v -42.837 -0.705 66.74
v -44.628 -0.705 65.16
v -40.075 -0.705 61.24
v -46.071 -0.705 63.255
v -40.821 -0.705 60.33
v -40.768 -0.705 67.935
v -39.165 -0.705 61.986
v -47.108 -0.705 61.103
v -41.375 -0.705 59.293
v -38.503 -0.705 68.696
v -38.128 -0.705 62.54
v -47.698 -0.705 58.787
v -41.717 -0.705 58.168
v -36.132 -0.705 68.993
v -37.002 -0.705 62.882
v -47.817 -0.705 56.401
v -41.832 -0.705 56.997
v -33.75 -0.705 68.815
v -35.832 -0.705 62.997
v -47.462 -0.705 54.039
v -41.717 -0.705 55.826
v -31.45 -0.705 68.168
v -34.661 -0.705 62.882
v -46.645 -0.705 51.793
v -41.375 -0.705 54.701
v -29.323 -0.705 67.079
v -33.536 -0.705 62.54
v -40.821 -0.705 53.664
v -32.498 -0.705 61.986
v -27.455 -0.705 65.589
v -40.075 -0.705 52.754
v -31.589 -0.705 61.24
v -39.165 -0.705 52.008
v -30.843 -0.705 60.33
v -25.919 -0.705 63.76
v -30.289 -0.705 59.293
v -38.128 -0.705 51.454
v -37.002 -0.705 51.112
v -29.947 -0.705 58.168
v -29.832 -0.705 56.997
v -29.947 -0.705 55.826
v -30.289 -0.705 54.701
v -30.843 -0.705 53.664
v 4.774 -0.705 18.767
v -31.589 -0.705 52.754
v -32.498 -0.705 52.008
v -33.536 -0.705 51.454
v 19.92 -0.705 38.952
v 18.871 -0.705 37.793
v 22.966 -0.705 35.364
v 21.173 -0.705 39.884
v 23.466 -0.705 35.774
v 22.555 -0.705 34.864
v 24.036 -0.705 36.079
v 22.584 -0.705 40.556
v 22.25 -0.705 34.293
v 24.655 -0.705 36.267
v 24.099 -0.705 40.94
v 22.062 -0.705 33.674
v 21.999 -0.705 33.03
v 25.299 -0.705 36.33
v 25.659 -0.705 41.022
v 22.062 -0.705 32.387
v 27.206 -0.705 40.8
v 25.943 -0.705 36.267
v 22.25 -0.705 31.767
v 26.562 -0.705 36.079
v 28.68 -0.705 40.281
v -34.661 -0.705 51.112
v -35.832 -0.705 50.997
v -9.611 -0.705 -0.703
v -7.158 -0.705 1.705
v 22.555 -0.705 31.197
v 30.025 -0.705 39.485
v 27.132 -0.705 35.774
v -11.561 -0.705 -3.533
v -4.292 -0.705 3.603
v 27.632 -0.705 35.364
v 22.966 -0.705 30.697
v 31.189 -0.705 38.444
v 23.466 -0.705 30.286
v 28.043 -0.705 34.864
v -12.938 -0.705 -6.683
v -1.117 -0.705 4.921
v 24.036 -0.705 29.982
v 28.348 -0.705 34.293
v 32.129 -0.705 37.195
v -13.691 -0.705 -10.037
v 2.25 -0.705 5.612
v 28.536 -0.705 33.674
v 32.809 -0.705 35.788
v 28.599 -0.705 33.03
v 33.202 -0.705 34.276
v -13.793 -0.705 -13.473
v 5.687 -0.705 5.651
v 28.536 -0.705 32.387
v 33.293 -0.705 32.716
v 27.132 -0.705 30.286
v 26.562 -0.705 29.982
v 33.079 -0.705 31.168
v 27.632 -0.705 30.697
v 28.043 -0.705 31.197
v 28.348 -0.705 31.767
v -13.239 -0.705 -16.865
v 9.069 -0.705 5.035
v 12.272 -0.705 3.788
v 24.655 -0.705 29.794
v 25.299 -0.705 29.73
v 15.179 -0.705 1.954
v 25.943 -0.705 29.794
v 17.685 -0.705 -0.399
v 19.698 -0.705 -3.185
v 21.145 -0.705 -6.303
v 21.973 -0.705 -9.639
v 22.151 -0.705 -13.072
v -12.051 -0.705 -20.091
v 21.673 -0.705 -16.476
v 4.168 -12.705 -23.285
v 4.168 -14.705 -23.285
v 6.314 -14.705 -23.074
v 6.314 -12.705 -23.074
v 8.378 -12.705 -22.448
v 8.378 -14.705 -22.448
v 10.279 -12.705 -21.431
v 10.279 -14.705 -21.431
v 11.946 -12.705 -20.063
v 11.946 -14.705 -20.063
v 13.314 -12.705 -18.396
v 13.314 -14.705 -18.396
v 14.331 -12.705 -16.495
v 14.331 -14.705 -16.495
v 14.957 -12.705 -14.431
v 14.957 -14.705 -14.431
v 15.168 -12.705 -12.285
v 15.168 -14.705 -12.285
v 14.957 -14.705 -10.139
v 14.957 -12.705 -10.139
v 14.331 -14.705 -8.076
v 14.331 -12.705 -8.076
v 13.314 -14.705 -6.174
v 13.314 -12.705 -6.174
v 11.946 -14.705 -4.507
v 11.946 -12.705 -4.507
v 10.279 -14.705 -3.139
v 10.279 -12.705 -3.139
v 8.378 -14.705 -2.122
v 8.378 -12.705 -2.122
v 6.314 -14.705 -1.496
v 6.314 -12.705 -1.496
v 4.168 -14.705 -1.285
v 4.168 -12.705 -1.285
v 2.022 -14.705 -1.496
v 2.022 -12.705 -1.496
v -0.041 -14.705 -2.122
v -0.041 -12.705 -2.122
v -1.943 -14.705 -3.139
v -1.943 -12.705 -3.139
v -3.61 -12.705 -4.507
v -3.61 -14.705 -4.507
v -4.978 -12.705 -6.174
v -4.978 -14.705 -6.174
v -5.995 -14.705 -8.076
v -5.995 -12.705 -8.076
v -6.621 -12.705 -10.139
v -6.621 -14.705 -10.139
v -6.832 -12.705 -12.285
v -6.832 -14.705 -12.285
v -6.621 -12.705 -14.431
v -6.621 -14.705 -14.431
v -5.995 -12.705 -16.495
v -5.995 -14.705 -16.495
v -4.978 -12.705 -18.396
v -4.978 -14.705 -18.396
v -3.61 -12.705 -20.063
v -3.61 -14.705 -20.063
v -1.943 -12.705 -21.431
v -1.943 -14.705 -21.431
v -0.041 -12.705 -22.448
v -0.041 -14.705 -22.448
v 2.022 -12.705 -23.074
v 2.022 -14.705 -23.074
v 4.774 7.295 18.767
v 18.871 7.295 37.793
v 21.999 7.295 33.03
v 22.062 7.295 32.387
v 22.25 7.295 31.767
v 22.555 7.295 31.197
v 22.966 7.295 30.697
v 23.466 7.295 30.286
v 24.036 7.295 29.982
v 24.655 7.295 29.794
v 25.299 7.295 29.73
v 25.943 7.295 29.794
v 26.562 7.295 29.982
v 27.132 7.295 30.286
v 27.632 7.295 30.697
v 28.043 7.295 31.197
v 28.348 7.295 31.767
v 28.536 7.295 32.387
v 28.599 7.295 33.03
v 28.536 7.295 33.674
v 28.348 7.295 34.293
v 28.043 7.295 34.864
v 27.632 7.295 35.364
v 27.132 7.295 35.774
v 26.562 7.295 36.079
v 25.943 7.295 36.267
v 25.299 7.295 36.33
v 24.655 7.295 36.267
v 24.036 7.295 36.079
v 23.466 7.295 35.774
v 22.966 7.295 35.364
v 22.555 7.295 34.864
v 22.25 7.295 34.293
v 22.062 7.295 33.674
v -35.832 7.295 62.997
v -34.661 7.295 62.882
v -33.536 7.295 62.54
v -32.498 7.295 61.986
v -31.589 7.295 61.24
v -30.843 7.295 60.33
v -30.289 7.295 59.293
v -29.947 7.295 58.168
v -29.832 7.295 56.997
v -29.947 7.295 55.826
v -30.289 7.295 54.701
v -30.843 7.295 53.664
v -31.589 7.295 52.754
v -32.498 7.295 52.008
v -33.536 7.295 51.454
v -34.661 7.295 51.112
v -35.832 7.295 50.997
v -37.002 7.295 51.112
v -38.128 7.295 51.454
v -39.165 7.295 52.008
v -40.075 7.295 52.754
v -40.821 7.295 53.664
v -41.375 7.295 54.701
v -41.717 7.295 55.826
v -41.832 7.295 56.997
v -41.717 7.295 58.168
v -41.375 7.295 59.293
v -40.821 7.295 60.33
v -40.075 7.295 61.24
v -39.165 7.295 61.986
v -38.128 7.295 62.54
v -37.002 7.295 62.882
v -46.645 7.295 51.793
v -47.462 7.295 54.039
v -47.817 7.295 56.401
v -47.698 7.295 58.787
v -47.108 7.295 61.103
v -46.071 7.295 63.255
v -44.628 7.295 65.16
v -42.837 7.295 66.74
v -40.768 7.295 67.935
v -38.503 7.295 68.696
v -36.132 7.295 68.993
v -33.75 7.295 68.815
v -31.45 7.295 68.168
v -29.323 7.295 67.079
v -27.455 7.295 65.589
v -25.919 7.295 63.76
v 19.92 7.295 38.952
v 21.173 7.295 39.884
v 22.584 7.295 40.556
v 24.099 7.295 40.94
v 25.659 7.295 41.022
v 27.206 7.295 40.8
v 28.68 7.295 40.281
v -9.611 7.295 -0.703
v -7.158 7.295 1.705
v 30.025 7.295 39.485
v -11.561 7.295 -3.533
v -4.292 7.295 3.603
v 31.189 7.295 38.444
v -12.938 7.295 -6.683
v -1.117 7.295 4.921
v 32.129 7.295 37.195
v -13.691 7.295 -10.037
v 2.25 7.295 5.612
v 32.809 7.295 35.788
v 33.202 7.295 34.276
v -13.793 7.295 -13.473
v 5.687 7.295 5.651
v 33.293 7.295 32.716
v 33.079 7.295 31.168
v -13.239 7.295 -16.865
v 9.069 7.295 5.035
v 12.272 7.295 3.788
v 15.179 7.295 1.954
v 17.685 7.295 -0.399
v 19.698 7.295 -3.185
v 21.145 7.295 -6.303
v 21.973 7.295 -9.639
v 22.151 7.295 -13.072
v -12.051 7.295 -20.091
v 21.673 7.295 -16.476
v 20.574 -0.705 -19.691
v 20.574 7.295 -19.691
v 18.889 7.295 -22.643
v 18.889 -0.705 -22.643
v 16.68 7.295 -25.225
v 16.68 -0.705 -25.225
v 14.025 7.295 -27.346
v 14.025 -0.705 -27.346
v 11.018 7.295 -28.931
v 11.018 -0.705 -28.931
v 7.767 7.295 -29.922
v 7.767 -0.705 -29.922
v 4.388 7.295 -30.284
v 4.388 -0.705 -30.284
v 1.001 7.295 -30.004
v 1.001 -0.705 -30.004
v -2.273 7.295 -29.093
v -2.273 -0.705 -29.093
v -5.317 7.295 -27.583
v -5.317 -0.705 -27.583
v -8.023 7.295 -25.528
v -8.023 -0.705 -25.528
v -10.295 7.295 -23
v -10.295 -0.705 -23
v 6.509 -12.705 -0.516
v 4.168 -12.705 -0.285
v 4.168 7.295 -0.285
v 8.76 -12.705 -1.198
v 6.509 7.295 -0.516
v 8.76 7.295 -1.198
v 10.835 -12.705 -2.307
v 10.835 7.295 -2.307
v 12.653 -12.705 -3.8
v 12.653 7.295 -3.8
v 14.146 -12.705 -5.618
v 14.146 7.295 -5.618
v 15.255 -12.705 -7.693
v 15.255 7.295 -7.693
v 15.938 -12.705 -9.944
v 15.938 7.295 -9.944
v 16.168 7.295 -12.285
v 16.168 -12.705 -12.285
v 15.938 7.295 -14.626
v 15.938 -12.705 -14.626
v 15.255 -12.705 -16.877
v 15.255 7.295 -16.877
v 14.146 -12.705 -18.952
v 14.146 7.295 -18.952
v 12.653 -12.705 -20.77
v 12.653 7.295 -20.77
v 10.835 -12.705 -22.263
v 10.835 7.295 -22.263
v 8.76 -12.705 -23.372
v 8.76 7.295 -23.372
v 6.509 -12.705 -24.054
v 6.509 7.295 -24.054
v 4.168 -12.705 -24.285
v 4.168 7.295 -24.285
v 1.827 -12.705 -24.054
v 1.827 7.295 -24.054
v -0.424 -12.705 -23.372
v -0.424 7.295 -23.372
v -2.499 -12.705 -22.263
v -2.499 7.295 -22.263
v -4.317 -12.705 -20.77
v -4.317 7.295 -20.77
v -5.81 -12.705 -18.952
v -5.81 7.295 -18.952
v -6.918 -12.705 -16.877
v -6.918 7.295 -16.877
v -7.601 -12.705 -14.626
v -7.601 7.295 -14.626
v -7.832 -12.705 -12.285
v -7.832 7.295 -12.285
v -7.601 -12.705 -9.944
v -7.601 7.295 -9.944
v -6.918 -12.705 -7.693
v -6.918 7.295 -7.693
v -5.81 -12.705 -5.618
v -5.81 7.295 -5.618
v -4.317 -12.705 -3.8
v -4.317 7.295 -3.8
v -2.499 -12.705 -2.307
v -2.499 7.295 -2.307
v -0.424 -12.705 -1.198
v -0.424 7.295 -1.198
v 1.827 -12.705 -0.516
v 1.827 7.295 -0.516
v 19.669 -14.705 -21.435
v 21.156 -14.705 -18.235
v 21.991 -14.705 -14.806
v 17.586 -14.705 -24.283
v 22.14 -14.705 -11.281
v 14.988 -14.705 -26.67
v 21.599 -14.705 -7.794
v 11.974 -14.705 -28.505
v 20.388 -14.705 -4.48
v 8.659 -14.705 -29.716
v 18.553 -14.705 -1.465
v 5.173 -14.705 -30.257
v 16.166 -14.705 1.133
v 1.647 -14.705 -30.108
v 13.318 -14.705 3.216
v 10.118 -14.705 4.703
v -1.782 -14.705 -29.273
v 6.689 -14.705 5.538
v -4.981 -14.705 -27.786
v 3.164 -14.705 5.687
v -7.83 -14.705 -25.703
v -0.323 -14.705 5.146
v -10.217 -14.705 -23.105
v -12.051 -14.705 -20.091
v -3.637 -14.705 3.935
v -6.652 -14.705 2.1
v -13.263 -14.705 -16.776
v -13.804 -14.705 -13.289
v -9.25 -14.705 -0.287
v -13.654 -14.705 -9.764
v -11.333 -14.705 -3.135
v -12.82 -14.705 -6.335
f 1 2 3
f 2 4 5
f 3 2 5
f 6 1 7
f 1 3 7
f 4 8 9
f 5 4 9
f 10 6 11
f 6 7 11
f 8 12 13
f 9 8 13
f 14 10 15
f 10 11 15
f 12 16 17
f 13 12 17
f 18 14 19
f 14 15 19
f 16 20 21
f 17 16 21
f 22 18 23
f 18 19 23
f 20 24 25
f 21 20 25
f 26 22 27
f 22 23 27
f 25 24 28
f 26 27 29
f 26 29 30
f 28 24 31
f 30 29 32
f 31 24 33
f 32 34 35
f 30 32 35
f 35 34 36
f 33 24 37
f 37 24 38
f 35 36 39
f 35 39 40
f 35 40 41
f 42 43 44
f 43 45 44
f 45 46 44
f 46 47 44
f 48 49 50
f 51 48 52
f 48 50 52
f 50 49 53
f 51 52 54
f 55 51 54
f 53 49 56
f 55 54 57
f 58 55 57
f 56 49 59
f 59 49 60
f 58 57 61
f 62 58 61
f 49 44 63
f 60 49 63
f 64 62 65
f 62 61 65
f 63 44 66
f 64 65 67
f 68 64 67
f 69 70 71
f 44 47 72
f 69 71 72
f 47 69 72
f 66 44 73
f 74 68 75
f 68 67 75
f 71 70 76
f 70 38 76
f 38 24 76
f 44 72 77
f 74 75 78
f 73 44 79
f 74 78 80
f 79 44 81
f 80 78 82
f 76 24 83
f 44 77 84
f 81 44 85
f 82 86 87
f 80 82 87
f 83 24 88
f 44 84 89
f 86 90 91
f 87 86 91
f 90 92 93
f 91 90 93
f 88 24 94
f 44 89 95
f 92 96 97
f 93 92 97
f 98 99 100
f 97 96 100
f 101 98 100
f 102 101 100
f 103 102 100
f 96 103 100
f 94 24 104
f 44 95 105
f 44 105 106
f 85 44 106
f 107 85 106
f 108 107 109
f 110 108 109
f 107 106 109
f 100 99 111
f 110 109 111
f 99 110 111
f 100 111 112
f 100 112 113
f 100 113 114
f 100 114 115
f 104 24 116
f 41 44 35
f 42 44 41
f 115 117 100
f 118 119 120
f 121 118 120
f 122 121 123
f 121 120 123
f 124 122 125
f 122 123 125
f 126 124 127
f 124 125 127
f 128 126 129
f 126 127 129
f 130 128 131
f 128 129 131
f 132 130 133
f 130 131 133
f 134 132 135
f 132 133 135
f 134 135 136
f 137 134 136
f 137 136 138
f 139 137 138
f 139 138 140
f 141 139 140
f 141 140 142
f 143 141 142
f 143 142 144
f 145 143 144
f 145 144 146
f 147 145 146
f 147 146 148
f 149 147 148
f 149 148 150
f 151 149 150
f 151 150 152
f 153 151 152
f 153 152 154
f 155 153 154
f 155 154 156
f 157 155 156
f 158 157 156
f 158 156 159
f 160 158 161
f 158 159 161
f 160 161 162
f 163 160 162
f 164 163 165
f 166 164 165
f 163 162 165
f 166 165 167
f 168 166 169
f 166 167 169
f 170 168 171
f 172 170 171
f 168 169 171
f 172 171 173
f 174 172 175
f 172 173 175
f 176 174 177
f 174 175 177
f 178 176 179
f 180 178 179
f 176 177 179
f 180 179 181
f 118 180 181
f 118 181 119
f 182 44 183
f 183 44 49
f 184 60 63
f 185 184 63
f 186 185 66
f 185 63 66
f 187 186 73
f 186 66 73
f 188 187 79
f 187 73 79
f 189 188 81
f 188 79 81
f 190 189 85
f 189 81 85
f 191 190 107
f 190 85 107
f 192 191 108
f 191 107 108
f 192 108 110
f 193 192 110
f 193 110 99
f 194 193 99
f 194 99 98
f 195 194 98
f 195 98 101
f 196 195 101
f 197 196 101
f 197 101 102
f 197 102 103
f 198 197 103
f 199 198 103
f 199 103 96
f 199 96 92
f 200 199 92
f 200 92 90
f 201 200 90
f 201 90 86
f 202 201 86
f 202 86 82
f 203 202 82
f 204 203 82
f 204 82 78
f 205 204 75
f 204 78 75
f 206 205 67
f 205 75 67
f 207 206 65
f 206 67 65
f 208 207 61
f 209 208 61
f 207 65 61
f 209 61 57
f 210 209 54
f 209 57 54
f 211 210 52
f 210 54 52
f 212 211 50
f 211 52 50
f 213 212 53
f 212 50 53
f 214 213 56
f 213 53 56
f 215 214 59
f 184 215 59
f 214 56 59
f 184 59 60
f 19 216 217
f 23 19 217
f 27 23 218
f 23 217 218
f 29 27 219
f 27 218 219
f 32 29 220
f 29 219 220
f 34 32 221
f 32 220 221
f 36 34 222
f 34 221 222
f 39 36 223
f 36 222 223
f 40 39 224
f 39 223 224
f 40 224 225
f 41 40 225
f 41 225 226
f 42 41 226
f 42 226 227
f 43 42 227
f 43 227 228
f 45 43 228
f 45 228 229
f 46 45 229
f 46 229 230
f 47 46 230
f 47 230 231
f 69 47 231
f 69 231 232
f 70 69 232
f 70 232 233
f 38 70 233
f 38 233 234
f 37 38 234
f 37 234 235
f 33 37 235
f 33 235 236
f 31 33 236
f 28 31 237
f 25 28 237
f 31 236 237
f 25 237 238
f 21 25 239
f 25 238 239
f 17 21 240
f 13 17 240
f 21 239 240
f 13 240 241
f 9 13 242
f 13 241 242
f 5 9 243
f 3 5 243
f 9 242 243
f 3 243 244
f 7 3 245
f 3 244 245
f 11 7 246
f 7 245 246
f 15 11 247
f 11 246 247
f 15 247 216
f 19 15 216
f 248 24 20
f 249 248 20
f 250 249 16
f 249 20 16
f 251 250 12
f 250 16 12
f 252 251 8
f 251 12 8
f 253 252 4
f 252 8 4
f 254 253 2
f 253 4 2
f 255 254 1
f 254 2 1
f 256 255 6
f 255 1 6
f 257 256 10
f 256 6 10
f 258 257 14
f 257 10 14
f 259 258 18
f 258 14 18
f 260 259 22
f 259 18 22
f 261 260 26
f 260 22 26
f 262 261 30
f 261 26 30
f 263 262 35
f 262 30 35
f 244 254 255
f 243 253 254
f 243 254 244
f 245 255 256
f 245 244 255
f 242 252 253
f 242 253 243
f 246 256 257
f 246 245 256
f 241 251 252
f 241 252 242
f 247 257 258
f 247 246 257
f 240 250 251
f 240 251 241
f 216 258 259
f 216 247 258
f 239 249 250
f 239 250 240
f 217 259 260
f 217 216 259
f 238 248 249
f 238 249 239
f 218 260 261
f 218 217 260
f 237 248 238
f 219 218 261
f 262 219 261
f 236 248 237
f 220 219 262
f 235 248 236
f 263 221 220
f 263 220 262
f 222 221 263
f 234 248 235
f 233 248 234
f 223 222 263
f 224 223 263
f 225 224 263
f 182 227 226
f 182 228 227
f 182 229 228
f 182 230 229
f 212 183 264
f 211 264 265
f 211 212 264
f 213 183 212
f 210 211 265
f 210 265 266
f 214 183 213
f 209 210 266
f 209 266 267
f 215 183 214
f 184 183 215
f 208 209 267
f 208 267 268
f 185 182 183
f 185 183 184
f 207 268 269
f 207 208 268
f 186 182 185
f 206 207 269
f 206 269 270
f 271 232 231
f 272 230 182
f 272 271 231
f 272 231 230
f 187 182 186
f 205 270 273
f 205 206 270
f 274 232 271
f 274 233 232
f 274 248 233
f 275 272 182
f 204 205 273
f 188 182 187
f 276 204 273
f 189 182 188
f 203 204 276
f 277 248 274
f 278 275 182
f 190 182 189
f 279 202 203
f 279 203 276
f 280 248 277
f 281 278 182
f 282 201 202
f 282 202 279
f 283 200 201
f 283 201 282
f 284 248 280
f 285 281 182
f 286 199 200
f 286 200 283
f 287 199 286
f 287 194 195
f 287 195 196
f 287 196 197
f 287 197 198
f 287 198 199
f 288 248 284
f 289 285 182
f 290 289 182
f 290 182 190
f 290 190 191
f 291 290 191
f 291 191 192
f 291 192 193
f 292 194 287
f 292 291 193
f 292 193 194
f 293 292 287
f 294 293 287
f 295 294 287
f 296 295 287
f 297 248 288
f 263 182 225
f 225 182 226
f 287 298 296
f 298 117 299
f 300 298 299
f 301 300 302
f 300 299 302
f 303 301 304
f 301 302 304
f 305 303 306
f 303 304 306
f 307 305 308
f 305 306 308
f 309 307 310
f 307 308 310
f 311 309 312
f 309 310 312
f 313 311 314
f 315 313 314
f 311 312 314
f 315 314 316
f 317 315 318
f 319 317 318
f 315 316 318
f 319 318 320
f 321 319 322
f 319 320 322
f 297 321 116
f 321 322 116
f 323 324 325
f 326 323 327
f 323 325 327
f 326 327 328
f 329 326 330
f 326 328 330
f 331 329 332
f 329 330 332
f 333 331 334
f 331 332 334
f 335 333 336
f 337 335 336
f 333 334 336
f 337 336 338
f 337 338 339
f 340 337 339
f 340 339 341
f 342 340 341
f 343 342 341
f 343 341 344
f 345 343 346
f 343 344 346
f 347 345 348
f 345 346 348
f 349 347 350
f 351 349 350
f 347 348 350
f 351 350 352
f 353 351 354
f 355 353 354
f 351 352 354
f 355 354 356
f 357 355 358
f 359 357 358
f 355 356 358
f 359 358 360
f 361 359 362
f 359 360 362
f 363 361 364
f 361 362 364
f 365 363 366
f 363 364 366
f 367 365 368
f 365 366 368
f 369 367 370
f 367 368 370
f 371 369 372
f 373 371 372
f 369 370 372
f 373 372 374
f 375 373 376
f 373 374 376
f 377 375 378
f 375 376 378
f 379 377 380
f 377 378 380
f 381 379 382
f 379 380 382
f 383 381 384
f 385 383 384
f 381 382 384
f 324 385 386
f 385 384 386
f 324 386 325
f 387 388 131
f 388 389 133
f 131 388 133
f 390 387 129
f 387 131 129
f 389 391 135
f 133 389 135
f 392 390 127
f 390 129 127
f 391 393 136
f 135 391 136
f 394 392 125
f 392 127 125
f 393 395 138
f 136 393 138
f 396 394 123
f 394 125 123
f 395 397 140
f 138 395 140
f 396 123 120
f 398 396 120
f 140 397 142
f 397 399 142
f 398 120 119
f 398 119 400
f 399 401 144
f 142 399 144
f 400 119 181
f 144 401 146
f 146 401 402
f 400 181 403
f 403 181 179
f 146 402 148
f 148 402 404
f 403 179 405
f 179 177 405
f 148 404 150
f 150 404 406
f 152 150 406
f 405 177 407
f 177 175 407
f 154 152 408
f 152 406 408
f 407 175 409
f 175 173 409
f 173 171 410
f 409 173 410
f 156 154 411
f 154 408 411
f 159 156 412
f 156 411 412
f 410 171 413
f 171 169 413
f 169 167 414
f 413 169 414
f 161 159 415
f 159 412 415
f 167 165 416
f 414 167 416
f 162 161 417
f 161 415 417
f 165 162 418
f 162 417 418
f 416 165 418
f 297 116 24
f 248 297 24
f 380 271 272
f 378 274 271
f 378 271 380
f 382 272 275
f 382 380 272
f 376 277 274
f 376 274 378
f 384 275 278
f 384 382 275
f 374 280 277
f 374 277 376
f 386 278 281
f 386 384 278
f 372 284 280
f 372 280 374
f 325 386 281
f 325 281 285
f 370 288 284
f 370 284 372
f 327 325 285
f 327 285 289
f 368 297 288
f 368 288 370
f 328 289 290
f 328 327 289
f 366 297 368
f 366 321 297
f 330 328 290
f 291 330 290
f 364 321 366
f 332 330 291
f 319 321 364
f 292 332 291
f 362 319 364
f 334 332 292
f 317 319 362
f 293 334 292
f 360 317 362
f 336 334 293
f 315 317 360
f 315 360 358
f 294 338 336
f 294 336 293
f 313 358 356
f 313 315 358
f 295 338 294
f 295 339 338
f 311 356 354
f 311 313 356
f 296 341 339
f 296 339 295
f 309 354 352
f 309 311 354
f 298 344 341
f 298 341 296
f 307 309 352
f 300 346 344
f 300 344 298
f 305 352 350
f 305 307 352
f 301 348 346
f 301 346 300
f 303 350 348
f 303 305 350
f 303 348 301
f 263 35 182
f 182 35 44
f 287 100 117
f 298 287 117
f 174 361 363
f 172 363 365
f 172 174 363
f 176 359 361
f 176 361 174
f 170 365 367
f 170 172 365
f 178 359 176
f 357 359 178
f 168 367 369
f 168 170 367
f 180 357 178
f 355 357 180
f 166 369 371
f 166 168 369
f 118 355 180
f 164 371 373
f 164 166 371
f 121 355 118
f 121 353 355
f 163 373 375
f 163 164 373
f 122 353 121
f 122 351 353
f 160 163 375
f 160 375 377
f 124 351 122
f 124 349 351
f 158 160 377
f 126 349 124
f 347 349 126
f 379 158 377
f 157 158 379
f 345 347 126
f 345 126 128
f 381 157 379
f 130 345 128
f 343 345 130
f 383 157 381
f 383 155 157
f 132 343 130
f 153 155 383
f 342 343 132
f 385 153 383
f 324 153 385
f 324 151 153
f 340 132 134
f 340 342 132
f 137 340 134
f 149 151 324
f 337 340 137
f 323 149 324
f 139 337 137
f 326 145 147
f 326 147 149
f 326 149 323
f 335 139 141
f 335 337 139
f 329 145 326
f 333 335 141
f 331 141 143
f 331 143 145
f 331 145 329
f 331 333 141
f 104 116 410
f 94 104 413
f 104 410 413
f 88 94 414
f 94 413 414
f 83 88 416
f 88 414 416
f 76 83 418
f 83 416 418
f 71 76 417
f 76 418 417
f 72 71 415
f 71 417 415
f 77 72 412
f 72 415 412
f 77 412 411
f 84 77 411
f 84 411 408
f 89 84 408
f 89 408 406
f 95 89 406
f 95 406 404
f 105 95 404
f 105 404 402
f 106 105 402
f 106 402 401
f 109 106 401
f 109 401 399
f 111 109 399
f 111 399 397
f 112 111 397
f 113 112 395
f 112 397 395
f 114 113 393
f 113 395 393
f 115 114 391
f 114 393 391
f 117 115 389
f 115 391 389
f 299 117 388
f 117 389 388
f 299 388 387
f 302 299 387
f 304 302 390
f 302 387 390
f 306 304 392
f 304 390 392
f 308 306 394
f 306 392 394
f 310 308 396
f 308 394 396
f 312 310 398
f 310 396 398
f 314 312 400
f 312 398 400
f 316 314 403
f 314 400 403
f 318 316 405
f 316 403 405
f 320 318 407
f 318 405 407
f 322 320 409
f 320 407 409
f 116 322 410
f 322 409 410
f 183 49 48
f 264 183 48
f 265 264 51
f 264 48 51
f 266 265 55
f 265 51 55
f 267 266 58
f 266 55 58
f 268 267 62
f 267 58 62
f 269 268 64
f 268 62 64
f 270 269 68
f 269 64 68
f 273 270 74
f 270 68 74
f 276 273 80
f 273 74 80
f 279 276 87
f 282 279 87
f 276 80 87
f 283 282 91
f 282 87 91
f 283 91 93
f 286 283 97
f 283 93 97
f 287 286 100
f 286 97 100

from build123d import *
from build123d.topology import SkipClean

# Parameters (mm, degrees)
EXTRUDE_1_DEPTH     = 4
EXTRUDE_START       = -11
SKETCH_3_R          = 9
EXTRUDE_2_DEPTH     = 11
SKETCH_4_R          = 3
CUT_EXTRUDE_1_DEPTH = 50.484262082
HOLE_WIZARD_M4_1_D  = 3.3
SKETCH_10_R         = 6
CUT_EXTRUDE_2_DEPTH = 10
SKETCH_11_R         = 5.5
CUT_EXTRUDE_3_DEPTH = 50.484262082
SCALE1_SCALE        = 2


with BuildPart() as part:
    # 草图1 → 凸台-拉伸1 (new body)
    with BuildSketch(Plane(origin=(0, 0, 0), x_dir=(1, 0, 0), z_dir=(0, 1, 0))):
        with BuildLine():
            Line((-8.109776452, 3.902758754), (-25.406517635, -32.039176982))
            ThreePointArc((-25.406517635, -32.039176982), (-23, -39.837168574), (-15.043482365, -38.022278184))
            Line((-15.043482365, -38.022278184), (0.302963304, -15.526261061))
            Line((0.302963304, -15.526261061), (7.351564548, -25.039059461))
            ThreePointArc((7.351564548, -25.039059461), (12.25592959, -26.282925824), (14.455537758, -21.72642235))
            Line((14.455537758, -21.72642235), (8.752682732, 2.095362733))
            ThreePointArc((8.752682732, 2.095362733), (0.95916746, 8.948742805), (-8.109776452, 3.902758754))
        make_face()
    extrude(amount=EXTRUDE_1_DEPTH)

    # 草图3 → 凸台-拉伸2 (add)
    with SkipClean():  # the faces are left unmerged after this step: merging them gives an invalid solid
        with BuildSketch(Plane(origin=(0, 4, 0), x_dir=(1, 0, 0), z_dir=(0, 1, 0)).offset(EXTRUDE_START)):
            with Locations(Location((0, 0, 0), (0, 0, 154.301222305))):
                Circle(SKETCH_3_R)
        extrude(amount=EXTRUDE_2_DEPTH)

    # 草图4 → 切除-拉伸1 (cut, through all)
    with SkipClean():  # the faces are left unmerged after this step: merging them gives an invalid solid
        with BuildSketch(Plane(origin=(0, 4, 0), x_dir=(1, 0, 0), z_dir=(0, 1, 0))):
            with Locations(Location((-20, -34.641016151, 0), (0, 0, 270))):
                Circle(SKETCH_4_R)
        extrude(amount=-CUT_EXTRUDE_1_DEPTH, mode=Mode.SUBTRACT)

    # M4 螺纹孔1 (through all)
    with Locations(Plane(origin=(0, 4, 0), x_dir=(1, 0, 0), z_dir=(0, 1, 0))):
        with Locations((10.565456544, -22.657694676)):
            Hole(HOLE_WIZARD_M4_1_D / 2)

    # 草图10 → 切除-拉伸2 (cut)
    with SkipClean():  # the faces are left unmerged after this step: merging them gives an invalid solid
        with BuildSketch(Plane(origin=(0, 4, 0), x_dir=(1, 0, 0), z_dir=(0, 1, 0))):
            with Locations(Location((0, 0, 0), (0, 0, 270))):
                Circle(SKETCH_10_R)
        extrude(amount=-CUT_EXTRUDE_2_DEPTH, mode=Mode.SUBTRACT)

    # 草图11 → 切除-拉伸3 (cut, through all)
    with SkipClean():  # the faces are left unmerged after this step: merging them gives an invalid solid
        with BuildSketch(Plane.XZ.offset(7)):
            with Locations(Location((0, 0, 0), (0, 0, 270))):
                Circle(SKETCH_11_R)
        extrude(amount=-CUT_EXTRUDE_3_DEPTH, mode=Mode.SUBTRACT)


with BuildPart() as part_1:
    # Scale1: scaled about (-4.168101576, 0.704724682, 12.285042226)
    add(part.part.scale(SCALE1_SCALE).moved(Location((4.168101576, -0.704724682, -12.285042226))))


solid = part_1.part
